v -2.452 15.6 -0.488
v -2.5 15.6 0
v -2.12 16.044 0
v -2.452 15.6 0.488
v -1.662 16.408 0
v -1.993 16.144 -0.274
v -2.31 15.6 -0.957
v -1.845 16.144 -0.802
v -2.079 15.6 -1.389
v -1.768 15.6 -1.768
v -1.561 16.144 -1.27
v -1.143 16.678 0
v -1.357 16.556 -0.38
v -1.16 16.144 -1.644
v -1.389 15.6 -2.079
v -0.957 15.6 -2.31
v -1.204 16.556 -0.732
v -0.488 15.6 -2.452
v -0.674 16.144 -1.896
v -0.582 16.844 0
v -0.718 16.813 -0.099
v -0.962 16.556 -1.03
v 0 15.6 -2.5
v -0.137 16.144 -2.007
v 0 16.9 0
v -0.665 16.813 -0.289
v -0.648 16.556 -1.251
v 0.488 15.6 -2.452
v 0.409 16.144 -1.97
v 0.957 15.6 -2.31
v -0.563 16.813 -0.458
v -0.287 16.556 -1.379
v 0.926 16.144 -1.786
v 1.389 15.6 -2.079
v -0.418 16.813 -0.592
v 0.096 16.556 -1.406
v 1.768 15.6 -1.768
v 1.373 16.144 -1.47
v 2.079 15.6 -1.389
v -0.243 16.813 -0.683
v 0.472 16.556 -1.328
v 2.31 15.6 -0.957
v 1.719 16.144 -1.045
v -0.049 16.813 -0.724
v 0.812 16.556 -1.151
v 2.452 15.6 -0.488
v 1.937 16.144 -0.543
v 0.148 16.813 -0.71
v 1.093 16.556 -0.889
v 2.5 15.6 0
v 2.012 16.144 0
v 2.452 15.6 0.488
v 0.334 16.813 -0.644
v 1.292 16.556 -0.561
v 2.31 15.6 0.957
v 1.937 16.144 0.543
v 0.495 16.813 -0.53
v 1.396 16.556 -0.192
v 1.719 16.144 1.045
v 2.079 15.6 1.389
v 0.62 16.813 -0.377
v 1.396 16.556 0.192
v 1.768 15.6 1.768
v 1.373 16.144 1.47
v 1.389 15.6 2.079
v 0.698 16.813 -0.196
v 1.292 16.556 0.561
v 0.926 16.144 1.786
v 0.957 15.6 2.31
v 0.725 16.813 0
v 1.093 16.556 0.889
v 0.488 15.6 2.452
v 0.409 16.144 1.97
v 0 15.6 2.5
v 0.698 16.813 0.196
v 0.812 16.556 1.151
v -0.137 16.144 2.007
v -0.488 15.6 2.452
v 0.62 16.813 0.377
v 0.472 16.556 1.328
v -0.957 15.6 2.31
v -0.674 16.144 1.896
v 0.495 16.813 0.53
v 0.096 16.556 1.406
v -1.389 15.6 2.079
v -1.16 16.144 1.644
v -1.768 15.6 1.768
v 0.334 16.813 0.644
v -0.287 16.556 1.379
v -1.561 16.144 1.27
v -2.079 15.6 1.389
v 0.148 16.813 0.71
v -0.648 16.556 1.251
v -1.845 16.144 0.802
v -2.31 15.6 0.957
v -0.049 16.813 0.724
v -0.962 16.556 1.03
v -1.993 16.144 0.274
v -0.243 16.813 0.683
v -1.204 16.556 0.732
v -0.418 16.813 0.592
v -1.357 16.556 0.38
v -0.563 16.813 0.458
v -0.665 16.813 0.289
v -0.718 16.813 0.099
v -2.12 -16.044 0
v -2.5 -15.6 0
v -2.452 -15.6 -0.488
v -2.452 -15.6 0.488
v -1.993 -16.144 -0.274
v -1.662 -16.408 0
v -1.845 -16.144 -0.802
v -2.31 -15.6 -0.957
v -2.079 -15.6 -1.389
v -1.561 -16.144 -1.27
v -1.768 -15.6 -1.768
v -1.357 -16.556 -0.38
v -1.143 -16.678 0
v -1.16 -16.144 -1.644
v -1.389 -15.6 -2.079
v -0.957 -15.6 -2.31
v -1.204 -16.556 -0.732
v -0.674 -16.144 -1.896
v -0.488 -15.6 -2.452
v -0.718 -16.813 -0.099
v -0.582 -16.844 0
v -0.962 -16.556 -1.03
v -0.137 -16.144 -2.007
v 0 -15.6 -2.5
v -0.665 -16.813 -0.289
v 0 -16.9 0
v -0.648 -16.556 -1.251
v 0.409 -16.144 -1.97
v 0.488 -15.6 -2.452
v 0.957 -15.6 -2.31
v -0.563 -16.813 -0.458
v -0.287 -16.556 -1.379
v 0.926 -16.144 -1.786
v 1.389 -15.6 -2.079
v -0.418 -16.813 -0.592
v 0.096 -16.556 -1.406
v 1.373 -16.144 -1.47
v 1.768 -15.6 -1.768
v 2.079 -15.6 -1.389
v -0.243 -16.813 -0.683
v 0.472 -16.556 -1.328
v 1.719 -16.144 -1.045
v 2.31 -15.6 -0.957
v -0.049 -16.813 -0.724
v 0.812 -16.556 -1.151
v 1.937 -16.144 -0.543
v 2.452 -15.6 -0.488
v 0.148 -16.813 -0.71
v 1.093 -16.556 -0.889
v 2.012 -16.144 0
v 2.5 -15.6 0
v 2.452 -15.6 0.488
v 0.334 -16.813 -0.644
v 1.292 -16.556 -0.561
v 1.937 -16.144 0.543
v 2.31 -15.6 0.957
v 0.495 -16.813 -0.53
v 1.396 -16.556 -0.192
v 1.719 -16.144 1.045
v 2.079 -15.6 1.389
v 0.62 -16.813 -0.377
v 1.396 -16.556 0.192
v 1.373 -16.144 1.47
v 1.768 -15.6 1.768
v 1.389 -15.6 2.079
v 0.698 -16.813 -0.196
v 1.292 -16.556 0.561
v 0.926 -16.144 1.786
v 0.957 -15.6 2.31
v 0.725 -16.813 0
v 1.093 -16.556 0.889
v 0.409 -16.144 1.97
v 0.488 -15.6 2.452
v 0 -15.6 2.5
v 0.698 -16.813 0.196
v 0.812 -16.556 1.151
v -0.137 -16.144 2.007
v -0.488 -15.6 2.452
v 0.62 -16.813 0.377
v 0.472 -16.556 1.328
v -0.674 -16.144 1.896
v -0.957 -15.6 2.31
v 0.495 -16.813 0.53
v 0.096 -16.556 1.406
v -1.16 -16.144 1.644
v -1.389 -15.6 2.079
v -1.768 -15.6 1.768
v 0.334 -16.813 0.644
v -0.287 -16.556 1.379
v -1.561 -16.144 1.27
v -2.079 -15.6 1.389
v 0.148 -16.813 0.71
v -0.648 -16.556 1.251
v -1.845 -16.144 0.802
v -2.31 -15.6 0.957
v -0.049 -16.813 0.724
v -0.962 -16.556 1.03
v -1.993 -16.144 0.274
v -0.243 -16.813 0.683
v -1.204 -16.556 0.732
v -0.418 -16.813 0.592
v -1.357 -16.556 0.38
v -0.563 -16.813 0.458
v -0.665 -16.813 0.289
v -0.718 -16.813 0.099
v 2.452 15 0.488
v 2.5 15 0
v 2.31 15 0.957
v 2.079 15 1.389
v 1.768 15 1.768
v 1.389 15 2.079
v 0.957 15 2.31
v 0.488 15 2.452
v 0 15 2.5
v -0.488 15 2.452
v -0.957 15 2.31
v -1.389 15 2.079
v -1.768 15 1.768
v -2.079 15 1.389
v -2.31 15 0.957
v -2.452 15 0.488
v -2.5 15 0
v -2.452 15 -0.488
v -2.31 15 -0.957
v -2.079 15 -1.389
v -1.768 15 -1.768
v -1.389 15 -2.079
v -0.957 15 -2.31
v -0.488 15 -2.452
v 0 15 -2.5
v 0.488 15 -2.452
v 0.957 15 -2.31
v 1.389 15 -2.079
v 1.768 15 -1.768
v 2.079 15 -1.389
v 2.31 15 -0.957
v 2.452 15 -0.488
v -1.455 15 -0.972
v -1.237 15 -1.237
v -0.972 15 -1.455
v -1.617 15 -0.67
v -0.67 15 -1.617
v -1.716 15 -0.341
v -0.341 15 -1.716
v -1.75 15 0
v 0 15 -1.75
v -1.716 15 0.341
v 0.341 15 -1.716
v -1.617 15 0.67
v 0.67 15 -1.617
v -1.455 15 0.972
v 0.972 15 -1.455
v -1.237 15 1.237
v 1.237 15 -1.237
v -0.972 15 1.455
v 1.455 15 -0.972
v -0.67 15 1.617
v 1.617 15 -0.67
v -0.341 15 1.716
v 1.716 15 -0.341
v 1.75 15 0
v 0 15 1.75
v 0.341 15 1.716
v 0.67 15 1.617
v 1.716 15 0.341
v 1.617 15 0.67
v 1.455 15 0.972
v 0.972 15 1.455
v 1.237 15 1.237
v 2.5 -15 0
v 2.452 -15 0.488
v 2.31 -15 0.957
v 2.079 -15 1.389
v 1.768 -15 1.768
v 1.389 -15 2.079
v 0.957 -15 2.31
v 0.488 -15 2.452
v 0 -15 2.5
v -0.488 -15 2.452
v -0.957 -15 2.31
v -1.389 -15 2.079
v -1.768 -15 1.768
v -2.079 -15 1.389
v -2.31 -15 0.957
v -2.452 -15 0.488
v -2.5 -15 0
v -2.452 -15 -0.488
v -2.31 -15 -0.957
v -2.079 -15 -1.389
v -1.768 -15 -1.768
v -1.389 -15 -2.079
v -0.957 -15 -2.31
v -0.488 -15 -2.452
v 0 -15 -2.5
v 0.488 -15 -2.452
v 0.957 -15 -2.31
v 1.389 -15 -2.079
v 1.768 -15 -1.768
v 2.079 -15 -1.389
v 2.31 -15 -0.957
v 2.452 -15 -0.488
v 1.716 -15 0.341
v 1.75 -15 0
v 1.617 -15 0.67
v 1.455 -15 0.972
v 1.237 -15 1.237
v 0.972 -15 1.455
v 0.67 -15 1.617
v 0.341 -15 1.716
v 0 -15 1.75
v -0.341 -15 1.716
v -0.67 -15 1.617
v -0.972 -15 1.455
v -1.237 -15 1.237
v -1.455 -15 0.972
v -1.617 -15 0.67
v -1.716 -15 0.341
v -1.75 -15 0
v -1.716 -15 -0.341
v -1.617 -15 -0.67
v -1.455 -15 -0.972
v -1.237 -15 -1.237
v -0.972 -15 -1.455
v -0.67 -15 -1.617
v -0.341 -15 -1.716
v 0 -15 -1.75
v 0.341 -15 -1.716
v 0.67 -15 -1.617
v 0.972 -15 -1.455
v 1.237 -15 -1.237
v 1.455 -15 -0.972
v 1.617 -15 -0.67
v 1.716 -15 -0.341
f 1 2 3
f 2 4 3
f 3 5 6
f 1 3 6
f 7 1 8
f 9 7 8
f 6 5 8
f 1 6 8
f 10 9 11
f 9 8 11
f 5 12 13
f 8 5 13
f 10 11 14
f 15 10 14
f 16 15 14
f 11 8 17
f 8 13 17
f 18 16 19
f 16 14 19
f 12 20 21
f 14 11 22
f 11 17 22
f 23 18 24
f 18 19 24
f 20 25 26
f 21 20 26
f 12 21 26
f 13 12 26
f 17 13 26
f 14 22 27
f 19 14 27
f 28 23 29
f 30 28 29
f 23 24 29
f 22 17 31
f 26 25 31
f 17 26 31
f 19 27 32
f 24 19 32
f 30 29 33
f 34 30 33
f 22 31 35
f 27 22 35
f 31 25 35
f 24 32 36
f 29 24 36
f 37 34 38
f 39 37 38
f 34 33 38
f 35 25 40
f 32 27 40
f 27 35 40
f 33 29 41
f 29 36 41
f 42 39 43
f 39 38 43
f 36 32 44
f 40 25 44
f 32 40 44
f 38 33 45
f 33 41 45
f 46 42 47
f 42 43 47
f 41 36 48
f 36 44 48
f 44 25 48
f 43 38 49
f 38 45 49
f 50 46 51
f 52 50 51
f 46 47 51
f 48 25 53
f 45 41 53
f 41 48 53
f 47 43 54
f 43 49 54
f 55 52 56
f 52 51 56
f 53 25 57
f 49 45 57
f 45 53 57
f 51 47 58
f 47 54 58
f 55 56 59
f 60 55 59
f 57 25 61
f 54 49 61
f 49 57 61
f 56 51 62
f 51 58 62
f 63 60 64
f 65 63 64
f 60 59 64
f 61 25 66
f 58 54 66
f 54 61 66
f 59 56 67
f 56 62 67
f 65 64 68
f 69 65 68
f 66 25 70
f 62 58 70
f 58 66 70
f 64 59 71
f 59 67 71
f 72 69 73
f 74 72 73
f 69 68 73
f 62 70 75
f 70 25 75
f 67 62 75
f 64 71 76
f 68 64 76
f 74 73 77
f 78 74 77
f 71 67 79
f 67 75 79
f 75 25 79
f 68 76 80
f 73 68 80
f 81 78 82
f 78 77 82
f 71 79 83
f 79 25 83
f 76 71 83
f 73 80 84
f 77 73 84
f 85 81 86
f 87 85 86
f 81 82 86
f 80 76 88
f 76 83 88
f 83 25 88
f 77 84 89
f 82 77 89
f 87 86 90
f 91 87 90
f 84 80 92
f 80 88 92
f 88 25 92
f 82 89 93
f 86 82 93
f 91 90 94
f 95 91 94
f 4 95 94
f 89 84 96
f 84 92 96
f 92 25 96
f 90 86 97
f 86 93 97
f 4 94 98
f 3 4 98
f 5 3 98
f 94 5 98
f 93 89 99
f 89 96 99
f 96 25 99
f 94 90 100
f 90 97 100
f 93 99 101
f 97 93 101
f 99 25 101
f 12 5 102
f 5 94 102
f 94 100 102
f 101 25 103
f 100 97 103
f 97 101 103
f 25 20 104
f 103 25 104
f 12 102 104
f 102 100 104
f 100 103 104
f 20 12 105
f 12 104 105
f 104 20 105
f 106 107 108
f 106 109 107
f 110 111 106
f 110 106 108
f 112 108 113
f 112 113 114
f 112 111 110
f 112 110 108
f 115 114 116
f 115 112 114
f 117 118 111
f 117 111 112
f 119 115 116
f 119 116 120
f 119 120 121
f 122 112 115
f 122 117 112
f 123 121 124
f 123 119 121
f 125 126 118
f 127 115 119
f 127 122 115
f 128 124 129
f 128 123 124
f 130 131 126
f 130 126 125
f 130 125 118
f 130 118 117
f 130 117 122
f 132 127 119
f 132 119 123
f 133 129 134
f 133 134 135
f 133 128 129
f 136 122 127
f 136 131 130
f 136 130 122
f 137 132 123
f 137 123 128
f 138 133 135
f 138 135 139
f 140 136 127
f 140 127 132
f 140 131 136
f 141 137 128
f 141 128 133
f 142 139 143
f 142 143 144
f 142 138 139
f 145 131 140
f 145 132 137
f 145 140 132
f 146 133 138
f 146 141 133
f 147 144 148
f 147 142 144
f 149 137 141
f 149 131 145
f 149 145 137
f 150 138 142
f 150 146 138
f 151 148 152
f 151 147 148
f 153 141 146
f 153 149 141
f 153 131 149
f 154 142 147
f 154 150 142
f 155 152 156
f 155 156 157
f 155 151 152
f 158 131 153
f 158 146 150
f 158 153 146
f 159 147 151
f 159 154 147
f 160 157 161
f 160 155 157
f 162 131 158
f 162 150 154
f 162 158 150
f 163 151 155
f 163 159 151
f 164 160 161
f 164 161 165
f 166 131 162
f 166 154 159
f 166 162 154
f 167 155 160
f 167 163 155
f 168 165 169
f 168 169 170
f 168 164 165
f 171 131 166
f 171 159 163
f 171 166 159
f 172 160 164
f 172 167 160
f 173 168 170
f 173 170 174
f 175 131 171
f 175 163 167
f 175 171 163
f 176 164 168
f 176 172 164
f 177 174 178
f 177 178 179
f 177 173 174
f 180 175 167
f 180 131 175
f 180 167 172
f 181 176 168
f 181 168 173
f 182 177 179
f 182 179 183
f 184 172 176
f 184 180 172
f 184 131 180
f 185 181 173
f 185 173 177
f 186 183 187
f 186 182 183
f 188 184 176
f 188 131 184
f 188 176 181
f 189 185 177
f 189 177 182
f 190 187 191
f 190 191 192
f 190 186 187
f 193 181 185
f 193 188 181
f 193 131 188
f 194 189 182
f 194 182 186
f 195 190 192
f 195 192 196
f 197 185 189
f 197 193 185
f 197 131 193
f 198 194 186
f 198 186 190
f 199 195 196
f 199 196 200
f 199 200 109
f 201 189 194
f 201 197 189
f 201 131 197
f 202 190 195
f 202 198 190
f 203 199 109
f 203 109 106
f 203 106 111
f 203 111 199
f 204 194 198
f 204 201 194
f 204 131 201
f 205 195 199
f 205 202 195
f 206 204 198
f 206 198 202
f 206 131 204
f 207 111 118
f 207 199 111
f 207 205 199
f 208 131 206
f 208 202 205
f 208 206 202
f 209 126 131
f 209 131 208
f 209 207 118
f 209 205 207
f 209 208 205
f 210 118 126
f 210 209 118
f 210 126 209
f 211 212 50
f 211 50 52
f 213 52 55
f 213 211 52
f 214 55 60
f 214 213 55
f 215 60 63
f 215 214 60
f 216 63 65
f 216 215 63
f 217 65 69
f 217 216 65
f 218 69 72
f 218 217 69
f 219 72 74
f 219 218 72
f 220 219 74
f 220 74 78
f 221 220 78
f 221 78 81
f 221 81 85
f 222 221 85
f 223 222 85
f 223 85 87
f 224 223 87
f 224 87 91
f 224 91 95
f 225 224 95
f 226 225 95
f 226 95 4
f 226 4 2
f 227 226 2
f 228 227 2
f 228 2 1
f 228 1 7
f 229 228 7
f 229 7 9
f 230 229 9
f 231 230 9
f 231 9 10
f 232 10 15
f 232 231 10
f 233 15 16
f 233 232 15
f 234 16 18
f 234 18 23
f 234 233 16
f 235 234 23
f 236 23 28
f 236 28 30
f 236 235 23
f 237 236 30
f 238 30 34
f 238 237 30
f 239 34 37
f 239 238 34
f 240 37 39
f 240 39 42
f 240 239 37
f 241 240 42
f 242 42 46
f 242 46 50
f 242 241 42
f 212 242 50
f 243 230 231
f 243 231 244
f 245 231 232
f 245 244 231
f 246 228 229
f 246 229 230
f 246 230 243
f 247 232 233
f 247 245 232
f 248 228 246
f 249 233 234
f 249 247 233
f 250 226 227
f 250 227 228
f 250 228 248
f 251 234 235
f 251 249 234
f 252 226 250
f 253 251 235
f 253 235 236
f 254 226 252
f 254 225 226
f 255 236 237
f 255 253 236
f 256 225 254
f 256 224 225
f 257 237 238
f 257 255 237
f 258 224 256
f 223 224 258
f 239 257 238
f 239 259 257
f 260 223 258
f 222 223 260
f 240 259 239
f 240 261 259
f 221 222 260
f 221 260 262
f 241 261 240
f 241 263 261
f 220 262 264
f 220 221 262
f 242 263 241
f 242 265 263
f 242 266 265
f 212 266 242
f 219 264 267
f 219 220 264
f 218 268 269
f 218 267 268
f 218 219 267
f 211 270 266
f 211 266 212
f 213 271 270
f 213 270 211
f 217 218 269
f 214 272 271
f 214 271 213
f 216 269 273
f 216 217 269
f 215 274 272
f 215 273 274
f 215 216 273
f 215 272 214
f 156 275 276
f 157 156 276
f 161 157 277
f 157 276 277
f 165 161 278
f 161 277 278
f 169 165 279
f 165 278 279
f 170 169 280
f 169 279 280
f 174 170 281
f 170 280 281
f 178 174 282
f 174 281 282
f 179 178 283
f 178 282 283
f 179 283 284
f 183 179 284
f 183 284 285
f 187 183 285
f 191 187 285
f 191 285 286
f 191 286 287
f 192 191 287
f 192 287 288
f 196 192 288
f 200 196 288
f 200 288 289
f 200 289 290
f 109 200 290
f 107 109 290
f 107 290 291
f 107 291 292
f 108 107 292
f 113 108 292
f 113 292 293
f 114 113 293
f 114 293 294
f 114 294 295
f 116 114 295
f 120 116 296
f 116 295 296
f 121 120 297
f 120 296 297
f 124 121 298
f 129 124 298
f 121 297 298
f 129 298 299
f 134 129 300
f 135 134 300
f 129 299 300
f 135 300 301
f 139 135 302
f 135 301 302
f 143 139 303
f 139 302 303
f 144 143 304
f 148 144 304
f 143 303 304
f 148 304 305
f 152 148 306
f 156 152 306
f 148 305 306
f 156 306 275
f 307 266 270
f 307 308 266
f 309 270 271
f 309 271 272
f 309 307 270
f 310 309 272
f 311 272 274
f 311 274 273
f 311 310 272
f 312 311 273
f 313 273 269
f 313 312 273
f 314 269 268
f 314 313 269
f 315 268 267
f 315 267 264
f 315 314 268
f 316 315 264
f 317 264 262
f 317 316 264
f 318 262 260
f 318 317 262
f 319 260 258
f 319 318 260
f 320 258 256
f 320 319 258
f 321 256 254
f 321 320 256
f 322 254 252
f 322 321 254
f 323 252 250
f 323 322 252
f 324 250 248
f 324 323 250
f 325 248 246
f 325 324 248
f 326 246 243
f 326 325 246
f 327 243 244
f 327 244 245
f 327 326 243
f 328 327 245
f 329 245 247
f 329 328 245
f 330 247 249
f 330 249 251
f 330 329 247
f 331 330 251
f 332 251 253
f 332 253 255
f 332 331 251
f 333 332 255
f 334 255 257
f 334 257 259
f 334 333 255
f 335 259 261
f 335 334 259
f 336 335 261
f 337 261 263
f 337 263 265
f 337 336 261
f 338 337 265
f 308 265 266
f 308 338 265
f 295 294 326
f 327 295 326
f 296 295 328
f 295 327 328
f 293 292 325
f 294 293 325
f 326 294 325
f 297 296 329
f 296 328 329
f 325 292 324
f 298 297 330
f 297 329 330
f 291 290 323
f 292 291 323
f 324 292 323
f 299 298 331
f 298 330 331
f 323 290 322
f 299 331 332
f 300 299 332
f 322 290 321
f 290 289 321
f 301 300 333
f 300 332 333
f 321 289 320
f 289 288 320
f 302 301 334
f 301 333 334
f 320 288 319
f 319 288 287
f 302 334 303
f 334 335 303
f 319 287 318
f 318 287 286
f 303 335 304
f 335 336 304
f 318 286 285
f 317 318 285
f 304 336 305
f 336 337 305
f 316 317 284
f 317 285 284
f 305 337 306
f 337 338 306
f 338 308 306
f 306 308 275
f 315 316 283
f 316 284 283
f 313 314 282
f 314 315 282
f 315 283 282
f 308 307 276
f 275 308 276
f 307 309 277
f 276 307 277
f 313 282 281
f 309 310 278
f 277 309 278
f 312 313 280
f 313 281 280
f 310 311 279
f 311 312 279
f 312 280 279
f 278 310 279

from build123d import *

# Parameters (mm, degrees)
F0_R     = 1.75
F1_DEPTH = 15
F2_R     = 2.5
F2_R_2   = 1.75
F3_DEPTH = 0.6


# Not quite as in the source:
# - a pattern or mirror of a feature is missing from the dataset's text; its kind, count and spacing are read off the source's solid


with BuildPart() as f1:
    # F0 (on Front) → F1 (new body, symmetric)
    with BuildSketch(Plane.XZ):
        Circle(F0_R)
    extrude(amount=F1_DEPTH, both=True)

    # F2 (on face) → F3 (join)
    with BuildSketch(Plane.XZ.offset(15)):
        Circle(F2_R)
        Circle(F2_R_2, mode=Mode.SUBTRACT)
        Circle(F2_R_2)
    f3 = extrude(amount=F3_DEPTH)

    # F3_copies: F3 across plane
    add(f3.mirror(Plane.ZX))

    # F4 (on Top) → F5 (revolve)
    with BuildSketch(Plane.XY):
        with BuildLine():
            Line((0, -16.9), (0, -15.6))
            Line((0, -15.6), (-2.5, -15.6))
            ThreePointArc((-2.5, -15.6), (-1.4089002804, -16.5555774622), (0, -16.9))
        make_face()
    f5 = revolve(axis=Axis((0, -16.1810277431, 0), (0, -1, 0)))

    # F5_copies: F5 across plane
    add(f5.mirror(Plane.ZX))


solid = f1.part
